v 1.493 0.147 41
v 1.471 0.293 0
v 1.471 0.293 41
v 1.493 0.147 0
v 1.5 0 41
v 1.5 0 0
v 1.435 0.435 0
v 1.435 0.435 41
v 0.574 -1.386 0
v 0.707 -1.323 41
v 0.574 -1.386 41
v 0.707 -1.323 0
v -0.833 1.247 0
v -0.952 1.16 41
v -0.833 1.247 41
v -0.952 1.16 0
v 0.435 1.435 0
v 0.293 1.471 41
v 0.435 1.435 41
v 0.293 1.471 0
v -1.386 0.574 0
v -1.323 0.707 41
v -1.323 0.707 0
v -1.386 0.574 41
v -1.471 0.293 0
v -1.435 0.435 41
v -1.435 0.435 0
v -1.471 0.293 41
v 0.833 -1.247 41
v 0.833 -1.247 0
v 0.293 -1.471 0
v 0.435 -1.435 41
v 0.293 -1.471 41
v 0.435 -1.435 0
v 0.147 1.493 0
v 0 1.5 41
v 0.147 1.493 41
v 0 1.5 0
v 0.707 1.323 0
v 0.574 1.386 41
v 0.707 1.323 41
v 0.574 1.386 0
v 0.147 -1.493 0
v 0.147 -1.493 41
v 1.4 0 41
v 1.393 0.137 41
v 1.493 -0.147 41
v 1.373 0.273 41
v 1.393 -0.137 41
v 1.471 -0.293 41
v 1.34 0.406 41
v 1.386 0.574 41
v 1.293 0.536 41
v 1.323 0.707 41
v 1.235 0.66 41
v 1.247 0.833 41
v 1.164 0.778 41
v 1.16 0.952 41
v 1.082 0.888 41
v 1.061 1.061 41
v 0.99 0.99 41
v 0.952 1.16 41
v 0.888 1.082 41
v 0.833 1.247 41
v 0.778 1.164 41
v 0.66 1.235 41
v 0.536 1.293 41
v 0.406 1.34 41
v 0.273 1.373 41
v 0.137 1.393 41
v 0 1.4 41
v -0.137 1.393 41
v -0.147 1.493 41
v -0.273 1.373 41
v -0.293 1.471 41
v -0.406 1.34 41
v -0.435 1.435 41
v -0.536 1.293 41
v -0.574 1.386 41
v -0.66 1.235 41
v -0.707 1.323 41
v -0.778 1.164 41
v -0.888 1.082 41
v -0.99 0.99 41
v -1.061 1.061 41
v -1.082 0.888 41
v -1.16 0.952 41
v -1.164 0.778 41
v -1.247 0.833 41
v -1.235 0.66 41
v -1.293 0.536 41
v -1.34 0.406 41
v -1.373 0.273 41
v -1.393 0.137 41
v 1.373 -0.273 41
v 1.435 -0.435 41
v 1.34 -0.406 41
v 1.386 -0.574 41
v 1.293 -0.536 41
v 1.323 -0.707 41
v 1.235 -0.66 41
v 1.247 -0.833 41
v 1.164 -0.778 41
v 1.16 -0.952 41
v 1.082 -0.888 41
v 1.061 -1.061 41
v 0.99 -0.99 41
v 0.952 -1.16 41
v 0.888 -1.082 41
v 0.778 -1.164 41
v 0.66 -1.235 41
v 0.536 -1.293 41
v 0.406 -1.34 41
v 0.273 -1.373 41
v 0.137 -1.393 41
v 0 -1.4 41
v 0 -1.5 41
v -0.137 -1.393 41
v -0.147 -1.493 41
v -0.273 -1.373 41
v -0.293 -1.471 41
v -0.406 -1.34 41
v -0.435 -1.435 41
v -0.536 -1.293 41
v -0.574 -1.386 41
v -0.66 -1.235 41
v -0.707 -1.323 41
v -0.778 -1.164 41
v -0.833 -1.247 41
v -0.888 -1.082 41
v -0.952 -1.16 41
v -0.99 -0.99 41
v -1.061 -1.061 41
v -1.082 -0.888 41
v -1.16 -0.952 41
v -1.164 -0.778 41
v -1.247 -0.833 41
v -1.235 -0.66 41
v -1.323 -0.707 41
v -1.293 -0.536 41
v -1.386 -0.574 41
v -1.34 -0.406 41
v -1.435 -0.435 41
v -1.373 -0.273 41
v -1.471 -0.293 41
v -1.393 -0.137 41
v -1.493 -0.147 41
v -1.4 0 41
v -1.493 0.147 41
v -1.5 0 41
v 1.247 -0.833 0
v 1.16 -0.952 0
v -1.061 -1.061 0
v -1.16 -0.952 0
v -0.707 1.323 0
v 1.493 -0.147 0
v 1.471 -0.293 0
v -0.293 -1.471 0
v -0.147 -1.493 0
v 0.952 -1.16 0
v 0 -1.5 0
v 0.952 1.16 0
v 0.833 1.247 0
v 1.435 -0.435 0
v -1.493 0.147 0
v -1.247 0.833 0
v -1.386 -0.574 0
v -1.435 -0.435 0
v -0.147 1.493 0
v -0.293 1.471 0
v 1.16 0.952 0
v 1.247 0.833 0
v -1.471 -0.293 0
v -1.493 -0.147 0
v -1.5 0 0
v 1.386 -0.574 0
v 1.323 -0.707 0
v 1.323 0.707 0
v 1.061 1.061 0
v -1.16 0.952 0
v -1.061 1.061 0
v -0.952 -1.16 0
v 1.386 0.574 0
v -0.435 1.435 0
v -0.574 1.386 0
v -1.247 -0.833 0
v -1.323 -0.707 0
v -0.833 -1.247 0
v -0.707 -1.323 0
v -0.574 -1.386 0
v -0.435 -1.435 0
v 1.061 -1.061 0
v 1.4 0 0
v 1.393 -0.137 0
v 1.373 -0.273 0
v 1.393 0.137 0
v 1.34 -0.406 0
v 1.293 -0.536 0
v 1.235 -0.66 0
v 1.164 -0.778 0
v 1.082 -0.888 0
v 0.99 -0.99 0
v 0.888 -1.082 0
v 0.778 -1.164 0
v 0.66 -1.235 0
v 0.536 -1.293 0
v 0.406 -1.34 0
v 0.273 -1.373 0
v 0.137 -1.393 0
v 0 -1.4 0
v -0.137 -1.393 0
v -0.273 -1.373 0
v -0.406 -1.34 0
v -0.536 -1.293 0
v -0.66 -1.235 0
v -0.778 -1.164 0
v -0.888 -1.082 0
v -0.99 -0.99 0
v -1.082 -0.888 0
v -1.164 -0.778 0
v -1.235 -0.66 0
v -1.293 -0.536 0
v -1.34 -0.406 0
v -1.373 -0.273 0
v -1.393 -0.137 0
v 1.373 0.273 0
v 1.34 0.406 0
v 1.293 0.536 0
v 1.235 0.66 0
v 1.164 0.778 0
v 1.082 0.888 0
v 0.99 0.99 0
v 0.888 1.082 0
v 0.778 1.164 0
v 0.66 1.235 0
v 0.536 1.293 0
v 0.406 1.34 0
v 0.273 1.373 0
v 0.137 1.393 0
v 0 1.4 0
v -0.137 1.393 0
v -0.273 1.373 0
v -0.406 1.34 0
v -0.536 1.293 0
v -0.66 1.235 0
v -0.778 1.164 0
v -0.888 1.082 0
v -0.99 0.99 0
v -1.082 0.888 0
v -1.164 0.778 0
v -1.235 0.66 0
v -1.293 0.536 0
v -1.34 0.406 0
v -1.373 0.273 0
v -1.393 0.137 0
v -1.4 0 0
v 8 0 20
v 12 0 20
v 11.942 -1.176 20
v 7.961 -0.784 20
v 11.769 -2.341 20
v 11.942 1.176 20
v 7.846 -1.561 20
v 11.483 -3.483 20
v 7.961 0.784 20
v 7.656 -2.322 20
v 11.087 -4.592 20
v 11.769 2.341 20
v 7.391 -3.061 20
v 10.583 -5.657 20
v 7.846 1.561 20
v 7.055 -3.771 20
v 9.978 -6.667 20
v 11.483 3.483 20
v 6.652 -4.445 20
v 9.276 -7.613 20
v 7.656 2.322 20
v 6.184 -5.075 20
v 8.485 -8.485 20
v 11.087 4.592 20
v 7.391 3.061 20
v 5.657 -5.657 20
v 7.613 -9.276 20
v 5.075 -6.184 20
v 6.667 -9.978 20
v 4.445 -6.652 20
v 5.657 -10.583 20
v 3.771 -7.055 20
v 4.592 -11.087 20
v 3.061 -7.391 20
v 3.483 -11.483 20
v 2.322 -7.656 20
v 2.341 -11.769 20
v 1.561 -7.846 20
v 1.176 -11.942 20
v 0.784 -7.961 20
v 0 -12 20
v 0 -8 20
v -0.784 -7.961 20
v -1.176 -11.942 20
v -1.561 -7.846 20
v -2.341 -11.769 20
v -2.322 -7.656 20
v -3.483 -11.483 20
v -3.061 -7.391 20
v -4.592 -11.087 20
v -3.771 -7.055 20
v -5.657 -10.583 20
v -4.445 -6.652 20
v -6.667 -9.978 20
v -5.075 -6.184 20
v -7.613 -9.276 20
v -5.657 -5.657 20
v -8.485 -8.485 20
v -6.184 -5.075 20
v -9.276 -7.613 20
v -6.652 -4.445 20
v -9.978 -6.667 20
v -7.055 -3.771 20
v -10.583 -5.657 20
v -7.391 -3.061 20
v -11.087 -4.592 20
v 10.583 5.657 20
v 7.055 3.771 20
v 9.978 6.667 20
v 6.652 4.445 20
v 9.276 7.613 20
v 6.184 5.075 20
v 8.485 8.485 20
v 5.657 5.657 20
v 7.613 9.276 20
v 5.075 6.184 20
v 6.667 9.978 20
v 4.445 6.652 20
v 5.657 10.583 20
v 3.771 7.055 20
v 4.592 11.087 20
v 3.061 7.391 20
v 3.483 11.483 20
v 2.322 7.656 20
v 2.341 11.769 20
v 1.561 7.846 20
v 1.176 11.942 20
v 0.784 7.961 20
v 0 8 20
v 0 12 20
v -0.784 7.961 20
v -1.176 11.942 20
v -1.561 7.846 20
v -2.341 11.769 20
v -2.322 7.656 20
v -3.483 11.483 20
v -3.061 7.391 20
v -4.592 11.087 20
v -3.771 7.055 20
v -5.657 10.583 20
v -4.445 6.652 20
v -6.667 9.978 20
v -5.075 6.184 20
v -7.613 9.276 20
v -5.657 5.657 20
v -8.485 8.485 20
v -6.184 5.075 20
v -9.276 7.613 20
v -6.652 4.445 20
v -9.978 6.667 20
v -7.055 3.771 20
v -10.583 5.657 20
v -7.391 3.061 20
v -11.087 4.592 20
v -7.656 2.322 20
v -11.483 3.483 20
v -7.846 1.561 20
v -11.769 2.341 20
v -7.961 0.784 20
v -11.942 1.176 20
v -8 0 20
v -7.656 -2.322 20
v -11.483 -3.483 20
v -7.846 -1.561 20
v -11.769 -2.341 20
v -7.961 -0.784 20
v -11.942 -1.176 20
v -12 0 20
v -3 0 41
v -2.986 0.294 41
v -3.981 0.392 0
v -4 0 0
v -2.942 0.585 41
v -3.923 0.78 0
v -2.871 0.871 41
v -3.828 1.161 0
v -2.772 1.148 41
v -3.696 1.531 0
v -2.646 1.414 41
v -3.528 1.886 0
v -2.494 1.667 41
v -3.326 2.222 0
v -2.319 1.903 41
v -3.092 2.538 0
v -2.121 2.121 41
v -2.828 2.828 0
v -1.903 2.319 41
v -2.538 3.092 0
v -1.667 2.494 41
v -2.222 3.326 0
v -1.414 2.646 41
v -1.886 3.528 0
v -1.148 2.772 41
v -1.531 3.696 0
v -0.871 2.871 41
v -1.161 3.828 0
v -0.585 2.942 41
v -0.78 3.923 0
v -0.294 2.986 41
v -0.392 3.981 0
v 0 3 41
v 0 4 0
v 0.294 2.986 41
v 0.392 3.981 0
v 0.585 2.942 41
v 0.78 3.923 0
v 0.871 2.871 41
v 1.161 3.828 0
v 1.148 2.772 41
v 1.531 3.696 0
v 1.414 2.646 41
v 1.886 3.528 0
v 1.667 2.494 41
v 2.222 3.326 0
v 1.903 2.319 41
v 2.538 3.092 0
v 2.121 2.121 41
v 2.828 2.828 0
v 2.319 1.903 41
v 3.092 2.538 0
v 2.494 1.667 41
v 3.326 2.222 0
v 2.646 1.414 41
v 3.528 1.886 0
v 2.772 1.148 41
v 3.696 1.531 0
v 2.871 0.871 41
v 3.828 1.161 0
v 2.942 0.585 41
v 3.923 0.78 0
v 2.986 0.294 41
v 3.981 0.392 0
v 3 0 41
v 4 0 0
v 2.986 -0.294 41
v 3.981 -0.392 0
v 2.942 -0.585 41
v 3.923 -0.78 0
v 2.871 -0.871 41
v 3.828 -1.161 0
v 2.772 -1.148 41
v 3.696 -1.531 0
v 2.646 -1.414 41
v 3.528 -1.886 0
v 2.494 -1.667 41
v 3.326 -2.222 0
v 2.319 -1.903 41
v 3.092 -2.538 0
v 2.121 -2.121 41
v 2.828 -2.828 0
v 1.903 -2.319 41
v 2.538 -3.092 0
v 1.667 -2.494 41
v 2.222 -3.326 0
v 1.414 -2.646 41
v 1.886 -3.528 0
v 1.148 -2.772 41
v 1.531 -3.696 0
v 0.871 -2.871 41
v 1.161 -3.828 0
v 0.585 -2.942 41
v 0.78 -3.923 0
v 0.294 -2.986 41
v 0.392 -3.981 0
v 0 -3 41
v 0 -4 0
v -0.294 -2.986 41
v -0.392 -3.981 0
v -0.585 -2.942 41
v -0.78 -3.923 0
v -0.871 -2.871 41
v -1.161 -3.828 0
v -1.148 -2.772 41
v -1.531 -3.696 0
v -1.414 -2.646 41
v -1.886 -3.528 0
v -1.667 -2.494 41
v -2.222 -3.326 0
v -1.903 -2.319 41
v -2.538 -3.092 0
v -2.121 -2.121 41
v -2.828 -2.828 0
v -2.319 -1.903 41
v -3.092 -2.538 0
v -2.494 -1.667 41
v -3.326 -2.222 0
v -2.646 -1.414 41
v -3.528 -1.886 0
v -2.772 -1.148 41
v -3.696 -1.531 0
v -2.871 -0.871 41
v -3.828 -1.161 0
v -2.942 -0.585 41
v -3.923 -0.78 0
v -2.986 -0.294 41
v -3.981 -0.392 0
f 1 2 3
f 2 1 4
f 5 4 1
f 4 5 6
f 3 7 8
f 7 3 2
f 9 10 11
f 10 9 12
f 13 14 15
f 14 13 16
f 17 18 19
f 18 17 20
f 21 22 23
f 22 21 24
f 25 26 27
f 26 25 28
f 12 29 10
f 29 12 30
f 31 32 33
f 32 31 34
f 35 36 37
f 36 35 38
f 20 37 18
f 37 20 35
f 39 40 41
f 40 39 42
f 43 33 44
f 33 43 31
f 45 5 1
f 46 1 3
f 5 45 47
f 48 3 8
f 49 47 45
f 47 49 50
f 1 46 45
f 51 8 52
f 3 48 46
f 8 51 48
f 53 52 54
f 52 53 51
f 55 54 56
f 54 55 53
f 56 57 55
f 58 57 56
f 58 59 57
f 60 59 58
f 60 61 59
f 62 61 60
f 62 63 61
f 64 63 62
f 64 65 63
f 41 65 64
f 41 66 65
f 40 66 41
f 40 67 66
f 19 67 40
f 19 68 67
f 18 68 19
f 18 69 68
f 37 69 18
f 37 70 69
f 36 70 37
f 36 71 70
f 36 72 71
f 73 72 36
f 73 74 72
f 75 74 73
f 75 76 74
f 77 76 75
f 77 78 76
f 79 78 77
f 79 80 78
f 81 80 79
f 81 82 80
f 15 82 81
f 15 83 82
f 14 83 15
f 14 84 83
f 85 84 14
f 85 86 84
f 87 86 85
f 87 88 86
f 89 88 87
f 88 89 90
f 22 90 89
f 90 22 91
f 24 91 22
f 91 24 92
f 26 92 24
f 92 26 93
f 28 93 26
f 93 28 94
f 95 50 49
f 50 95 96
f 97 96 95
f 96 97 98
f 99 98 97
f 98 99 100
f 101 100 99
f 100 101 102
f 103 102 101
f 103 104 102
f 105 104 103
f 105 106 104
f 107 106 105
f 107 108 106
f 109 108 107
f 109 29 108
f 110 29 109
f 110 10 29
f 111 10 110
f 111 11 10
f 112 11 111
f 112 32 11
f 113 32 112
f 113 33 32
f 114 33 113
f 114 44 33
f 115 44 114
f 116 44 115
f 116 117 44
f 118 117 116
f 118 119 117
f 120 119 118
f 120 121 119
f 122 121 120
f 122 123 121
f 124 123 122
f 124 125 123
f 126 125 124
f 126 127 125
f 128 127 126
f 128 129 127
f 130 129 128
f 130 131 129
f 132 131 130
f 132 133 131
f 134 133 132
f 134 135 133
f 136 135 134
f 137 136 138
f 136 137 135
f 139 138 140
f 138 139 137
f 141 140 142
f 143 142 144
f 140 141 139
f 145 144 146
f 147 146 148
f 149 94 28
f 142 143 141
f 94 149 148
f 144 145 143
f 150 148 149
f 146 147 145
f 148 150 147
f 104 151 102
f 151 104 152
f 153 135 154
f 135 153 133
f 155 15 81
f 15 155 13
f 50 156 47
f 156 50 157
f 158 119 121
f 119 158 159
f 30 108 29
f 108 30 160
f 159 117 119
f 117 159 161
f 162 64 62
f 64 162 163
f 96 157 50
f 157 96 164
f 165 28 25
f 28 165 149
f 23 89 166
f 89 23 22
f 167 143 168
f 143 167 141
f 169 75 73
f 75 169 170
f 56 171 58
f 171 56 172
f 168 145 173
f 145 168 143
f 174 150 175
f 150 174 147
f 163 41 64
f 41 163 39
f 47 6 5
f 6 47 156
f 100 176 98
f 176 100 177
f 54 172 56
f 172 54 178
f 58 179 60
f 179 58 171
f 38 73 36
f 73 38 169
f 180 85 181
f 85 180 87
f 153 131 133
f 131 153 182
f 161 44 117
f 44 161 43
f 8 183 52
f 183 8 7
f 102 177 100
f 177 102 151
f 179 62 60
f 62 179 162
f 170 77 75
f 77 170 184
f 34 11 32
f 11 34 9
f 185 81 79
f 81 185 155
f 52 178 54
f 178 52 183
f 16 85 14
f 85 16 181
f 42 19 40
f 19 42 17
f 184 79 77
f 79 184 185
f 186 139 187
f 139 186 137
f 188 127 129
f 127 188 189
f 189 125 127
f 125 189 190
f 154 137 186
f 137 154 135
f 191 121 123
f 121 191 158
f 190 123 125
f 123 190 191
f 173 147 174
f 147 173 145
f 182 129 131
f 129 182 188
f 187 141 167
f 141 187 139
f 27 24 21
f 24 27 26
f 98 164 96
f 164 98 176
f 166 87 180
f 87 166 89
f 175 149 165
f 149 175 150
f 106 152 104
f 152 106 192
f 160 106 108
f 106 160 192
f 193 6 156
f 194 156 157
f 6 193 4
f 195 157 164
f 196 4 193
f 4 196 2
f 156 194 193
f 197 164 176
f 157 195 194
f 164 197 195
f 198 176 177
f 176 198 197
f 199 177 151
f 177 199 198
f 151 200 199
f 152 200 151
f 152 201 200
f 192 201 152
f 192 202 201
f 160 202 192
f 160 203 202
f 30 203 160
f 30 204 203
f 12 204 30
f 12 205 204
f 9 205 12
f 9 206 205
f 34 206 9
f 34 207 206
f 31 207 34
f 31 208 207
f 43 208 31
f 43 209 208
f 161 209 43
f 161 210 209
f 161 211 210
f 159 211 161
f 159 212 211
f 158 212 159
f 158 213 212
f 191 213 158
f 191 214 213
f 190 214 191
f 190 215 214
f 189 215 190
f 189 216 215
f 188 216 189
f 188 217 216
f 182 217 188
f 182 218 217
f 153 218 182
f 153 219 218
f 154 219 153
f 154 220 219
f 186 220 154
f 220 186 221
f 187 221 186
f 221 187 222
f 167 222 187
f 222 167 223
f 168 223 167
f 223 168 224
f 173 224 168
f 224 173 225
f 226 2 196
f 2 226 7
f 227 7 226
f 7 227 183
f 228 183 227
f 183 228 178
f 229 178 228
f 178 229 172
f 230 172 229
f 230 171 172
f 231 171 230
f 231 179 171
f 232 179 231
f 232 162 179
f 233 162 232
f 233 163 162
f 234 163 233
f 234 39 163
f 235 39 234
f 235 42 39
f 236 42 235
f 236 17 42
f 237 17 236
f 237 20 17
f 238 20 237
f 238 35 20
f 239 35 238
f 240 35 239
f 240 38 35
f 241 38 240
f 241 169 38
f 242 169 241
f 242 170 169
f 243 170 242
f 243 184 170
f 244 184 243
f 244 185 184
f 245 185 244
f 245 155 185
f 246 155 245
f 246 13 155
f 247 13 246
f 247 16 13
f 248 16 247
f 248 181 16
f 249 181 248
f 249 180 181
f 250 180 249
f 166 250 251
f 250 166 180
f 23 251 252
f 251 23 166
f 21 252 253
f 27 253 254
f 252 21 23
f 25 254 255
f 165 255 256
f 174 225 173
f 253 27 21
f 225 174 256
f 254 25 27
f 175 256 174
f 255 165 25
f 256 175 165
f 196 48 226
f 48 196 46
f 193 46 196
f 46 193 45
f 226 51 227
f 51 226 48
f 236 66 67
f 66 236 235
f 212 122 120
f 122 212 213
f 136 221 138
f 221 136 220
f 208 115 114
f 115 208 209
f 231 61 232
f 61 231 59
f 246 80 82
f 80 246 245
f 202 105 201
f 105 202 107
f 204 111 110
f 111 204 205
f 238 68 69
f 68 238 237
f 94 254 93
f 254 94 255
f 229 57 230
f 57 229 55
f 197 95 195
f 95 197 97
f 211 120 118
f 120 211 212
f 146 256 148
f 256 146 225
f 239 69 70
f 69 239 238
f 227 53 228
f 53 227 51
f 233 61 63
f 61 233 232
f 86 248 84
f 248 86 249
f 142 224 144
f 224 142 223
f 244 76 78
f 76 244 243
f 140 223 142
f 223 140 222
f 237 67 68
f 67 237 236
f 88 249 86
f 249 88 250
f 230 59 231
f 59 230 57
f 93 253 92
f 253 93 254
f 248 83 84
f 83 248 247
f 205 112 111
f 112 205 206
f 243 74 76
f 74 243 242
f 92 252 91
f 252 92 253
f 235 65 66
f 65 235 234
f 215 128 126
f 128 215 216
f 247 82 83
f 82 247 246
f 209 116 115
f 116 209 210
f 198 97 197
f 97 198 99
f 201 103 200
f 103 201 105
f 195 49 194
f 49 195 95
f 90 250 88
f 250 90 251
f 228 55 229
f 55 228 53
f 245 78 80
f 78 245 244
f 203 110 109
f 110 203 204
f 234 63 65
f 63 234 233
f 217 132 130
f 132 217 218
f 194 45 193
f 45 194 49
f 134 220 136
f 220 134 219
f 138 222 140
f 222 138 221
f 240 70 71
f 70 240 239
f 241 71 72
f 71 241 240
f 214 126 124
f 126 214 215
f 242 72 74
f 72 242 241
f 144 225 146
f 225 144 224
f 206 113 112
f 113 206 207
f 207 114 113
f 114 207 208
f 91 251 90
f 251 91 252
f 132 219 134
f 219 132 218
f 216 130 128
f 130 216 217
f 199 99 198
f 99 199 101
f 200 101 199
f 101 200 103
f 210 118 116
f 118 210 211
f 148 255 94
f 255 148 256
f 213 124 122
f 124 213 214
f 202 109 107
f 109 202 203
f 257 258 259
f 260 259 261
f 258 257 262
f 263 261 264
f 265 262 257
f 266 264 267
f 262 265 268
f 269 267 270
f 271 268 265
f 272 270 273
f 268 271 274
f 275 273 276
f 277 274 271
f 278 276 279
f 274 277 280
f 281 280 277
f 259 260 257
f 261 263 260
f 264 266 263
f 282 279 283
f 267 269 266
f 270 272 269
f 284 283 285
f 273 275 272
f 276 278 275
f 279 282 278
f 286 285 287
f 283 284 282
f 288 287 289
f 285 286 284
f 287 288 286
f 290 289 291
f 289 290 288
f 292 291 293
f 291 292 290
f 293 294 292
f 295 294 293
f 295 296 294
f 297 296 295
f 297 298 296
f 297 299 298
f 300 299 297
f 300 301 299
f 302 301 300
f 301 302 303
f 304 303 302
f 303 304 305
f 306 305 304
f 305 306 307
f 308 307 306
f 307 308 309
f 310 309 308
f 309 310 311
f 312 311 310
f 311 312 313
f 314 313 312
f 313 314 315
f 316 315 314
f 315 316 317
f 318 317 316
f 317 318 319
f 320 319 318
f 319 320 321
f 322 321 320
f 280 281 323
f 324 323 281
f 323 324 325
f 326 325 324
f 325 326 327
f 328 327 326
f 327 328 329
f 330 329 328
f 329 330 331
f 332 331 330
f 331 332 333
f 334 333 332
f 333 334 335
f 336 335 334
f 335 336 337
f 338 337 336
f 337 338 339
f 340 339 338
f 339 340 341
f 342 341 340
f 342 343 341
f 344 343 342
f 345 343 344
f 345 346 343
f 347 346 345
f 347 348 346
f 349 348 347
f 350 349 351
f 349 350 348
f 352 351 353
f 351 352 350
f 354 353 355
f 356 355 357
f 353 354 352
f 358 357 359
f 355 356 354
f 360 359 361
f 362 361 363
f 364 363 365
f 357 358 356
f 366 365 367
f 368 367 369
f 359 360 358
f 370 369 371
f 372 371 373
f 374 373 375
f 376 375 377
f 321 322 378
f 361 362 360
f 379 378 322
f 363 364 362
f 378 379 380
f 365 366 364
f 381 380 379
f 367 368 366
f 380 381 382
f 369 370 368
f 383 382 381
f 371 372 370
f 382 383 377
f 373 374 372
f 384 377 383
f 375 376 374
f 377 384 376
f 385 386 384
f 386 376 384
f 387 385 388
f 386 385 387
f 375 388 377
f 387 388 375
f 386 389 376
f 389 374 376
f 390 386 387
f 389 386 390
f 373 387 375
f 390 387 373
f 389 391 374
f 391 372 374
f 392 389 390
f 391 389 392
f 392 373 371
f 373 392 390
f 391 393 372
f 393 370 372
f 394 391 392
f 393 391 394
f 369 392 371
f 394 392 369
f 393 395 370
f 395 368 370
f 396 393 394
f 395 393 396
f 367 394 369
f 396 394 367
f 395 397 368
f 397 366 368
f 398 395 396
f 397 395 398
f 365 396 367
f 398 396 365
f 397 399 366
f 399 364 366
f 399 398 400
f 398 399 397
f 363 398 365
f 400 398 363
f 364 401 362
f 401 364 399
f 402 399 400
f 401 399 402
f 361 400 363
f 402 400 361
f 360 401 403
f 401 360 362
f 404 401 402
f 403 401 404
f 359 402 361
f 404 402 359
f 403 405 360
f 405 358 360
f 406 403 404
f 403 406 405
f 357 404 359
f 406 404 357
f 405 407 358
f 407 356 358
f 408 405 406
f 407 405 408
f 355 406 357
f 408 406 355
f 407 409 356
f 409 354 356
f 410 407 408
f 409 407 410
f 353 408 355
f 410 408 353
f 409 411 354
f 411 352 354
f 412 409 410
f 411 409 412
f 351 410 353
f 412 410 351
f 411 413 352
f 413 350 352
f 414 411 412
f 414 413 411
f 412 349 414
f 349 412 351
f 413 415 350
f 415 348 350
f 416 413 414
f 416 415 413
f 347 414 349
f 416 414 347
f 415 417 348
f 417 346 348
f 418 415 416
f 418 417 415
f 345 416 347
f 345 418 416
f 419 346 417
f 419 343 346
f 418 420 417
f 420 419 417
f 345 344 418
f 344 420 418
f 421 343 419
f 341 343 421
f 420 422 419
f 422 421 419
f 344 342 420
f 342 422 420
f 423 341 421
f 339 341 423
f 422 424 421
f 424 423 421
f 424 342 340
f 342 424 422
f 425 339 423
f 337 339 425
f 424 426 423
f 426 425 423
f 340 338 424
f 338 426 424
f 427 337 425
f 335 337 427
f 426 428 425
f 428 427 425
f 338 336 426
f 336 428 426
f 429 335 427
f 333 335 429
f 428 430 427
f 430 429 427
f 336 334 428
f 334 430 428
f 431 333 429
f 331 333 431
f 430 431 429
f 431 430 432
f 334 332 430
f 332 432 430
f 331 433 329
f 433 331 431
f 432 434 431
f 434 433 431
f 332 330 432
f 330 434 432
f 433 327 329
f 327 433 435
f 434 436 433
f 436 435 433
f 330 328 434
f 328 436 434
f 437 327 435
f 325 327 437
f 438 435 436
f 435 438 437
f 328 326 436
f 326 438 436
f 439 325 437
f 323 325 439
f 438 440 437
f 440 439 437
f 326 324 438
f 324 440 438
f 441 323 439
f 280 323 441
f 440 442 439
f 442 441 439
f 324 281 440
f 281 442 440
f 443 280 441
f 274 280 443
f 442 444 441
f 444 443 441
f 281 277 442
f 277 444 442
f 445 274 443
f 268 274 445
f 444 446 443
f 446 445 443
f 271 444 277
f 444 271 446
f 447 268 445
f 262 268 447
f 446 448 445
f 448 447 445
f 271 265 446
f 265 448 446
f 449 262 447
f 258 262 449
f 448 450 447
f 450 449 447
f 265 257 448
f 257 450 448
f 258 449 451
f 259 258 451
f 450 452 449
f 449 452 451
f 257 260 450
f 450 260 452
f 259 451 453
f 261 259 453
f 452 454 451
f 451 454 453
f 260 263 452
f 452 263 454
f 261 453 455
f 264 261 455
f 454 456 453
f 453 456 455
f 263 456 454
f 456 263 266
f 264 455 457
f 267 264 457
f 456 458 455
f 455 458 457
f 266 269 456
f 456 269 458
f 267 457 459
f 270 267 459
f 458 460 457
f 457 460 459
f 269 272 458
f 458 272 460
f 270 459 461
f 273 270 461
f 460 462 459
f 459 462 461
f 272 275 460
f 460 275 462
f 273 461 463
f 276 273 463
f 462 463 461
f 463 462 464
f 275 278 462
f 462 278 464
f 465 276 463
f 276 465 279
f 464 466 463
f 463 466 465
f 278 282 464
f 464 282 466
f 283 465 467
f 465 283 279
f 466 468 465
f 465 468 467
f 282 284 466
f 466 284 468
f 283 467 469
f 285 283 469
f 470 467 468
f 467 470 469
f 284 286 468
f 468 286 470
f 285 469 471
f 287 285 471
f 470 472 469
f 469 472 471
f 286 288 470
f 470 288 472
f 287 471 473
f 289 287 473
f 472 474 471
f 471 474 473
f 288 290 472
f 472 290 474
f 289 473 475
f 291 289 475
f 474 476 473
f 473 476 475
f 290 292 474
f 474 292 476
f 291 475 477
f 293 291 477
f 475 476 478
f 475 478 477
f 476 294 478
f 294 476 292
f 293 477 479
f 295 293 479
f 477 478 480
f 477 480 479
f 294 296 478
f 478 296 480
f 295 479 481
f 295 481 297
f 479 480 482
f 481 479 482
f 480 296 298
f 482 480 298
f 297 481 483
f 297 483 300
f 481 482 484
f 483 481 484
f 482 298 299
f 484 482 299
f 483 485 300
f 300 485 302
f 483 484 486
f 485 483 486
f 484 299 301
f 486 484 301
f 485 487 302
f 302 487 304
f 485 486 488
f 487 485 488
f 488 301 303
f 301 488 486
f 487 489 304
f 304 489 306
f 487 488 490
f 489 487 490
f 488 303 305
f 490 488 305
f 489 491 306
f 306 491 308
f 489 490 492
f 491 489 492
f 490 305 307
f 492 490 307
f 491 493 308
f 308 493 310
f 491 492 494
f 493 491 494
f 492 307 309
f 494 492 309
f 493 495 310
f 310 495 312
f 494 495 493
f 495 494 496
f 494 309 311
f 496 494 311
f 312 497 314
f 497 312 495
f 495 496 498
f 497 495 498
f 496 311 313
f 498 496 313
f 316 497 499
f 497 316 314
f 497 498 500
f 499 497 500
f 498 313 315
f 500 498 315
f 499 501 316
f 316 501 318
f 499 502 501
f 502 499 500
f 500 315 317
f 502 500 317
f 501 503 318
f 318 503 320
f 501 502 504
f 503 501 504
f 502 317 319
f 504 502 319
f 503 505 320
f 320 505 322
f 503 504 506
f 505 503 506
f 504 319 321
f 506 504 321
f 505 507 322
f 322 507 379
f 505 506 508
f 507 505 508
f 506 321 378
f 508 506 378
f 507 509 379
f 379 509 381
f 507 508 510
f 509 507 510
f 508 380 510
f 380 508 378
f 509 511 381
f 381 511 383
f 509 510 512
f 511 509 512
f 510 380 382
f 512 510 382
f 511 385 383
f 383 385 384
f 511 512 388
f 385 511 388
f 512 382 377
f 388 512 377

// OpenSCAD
// Built by bench/smallmodels/features/compiler.py from a list of features.
$fn = 64;
union() {
    translate([0, 0, 0]) rotate_extrude() polygon([[4, 0], [8, 20], [12, 20], [3, 41]]);
    translate([0, 0, 0]) difference() { cylinder(d = 3, h = 41); translate([0, 0, -0.01]) cylinder(d = 2.8, h = 41.02); }
  }
